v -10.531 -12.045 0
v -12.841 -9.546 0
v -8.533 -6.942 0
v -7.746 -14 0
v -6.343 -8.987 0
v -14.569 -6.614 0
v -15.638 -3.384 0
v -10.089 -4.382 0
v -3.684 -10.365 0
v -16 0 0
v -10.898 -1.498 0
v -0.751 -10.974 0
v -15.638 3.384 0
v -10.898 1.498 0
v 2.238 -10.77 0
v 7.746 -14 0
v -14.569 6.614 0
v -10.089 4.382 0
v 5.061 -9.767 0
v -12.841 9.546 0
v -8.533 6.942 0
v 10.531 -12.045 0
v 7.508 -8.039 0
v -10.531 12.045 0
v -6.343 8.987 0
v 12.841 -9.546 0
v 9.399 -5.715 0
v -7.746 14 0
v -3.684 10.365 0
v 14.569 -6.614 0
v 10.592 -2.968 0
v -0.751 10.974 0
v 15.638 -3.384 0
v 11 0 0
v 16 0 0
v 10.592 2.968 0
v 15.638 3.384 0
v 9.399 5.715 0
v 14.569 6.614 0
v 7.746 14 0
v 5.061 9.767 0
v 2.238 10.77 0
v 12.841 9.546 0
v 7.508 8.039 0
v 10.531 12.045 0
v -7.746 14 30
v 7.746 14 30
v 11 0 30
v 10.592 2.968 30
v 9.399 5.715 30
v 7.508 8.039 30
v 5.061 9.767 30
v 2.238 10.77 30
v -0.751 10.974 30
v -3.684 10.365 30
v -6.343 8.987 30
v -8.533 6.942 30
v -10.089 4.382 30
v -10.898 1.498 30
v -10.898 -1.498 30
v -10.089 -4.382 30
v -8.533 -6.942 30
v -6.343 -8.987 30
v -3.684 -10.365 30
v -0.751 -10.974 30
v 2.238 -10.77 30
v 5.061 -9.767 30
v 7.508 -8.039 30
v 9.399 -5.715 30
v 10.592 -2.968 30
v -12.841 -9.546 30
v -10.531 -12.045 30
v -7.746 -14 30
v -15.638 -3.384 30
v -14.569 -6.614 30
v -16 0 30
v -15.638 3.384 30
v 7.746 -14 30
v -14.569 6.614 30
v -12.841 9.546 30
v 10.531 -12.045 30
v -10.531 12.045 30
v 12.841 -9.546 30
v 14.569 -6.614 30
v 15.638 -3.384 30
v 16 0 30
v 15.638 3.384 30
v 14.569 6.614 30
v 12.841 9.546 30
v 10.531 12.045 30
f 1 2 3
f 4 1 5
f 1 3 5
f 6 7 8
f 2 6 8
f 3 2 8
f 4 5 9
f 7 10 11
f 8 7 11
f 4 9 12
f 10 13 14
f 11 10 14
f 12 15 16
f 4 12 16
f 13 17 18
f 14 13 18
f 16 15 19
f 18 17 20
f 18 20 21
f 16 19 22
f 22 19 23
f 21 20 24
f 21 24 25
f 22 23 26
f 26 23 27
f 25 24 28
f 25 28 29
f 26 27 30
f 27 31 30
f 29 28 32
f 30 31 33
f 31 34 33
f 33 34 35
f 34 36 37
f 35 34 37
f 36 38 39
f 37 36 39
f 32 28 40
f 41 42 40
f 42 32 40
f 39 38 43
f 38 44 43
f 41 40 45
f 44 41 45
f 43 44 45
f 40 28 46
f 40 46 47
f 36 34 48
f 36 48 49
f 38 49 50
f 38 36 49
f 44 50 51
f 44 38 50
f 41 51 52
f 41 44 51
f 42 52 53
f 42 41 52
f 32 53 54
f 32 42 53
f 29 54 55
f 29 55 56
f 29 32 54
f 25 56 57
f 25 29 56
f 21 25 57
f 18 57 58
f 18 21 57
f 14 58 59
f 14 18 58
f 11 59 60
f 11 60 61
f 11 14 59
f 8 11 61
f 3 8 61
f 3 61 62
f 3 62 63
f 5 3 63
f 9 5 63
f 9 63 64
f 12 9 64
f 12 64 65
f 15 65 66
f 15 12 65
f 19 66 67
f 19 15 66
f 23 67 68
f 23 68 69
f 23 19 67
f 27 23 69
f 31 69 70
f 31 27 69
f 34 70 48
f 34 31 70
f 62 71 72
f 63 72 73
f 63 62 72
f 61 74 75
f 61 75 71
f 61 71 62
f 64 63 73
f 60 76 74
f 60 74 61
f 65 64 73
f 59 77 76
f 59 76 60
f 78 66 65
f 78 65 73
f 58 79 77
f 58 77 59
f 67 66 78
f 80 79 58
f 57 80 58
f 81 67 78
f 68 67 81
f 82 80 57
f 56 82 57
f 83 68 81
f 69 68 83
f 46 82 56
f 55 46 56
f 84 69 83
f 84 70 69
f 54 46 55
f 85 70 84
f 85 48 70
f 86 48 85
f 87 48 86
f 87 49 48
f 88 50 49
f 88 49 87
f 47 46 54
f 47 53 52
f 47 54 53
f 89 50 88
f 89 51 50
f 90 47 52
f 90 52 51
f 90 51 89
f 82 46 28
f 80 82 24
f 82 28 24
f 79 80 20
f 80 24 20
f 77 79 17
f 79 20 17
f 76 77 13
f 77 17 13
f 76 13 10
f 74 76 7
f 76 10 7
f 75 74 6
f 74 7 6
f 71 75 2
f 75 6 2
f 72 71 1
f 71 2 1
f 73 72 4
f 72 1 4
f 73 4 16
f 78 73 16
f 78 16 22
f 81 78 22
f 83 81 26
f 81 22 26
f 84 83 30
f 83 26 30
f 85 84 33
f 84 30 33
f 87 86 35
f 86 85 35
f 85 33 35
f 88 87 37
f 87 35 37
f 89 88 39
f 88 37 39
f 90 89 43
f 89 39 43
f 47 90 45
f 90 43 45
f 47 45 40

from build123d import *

# Parameters (mm, degrees)
SCHIZZO2_R                   = 16
SCHIZZO2_R_2                 = 11
ESTRUSIONE_ESTRUSIONE1_DEPTH = 30
SCHIZZO3_W                   = 40.226432455
SCHIZZO3_H                   = 6.242620643
SCHIZZO3_W_2                 = 42.895225343
SCHIZZO3_H_2                 = 8.147240474
TAGLIO_ESTRUSIONE1_DEPTH     = 31


with BuildPart() as part:
    # Schizzo2 → Estrusione-Estrusione1 (new body)
    with BuildSketch(Plane.XY):
        Circle(SCHIZZO2_R)
        Circle(SCHIZZO2_R_2, mode=Mode.SUBTRACT)
    extrude(amount=ESTRUSIONE_ESTRUSIONE1_DEPTH)

    # Schizzo3 → Taglio-Estrusione1 (cut, through all)
    with BuildSketch(Plane.XY.offset(30)):
        with Locations((2.318761875, 17.121310322)):
            Rectangle(SCHIZZO3_W, SCHIZZO3_H)
        with Locations((2.584078566, -18.073620237)):
            Rectangle(SCHIZZO3_W_2, SCHIZZO3_H_2)
    extrude(amount=-TAGLIO_ESTRUSIONE1_DEPTH, mode=Mode.SUBTRACT)


solid = part.part
